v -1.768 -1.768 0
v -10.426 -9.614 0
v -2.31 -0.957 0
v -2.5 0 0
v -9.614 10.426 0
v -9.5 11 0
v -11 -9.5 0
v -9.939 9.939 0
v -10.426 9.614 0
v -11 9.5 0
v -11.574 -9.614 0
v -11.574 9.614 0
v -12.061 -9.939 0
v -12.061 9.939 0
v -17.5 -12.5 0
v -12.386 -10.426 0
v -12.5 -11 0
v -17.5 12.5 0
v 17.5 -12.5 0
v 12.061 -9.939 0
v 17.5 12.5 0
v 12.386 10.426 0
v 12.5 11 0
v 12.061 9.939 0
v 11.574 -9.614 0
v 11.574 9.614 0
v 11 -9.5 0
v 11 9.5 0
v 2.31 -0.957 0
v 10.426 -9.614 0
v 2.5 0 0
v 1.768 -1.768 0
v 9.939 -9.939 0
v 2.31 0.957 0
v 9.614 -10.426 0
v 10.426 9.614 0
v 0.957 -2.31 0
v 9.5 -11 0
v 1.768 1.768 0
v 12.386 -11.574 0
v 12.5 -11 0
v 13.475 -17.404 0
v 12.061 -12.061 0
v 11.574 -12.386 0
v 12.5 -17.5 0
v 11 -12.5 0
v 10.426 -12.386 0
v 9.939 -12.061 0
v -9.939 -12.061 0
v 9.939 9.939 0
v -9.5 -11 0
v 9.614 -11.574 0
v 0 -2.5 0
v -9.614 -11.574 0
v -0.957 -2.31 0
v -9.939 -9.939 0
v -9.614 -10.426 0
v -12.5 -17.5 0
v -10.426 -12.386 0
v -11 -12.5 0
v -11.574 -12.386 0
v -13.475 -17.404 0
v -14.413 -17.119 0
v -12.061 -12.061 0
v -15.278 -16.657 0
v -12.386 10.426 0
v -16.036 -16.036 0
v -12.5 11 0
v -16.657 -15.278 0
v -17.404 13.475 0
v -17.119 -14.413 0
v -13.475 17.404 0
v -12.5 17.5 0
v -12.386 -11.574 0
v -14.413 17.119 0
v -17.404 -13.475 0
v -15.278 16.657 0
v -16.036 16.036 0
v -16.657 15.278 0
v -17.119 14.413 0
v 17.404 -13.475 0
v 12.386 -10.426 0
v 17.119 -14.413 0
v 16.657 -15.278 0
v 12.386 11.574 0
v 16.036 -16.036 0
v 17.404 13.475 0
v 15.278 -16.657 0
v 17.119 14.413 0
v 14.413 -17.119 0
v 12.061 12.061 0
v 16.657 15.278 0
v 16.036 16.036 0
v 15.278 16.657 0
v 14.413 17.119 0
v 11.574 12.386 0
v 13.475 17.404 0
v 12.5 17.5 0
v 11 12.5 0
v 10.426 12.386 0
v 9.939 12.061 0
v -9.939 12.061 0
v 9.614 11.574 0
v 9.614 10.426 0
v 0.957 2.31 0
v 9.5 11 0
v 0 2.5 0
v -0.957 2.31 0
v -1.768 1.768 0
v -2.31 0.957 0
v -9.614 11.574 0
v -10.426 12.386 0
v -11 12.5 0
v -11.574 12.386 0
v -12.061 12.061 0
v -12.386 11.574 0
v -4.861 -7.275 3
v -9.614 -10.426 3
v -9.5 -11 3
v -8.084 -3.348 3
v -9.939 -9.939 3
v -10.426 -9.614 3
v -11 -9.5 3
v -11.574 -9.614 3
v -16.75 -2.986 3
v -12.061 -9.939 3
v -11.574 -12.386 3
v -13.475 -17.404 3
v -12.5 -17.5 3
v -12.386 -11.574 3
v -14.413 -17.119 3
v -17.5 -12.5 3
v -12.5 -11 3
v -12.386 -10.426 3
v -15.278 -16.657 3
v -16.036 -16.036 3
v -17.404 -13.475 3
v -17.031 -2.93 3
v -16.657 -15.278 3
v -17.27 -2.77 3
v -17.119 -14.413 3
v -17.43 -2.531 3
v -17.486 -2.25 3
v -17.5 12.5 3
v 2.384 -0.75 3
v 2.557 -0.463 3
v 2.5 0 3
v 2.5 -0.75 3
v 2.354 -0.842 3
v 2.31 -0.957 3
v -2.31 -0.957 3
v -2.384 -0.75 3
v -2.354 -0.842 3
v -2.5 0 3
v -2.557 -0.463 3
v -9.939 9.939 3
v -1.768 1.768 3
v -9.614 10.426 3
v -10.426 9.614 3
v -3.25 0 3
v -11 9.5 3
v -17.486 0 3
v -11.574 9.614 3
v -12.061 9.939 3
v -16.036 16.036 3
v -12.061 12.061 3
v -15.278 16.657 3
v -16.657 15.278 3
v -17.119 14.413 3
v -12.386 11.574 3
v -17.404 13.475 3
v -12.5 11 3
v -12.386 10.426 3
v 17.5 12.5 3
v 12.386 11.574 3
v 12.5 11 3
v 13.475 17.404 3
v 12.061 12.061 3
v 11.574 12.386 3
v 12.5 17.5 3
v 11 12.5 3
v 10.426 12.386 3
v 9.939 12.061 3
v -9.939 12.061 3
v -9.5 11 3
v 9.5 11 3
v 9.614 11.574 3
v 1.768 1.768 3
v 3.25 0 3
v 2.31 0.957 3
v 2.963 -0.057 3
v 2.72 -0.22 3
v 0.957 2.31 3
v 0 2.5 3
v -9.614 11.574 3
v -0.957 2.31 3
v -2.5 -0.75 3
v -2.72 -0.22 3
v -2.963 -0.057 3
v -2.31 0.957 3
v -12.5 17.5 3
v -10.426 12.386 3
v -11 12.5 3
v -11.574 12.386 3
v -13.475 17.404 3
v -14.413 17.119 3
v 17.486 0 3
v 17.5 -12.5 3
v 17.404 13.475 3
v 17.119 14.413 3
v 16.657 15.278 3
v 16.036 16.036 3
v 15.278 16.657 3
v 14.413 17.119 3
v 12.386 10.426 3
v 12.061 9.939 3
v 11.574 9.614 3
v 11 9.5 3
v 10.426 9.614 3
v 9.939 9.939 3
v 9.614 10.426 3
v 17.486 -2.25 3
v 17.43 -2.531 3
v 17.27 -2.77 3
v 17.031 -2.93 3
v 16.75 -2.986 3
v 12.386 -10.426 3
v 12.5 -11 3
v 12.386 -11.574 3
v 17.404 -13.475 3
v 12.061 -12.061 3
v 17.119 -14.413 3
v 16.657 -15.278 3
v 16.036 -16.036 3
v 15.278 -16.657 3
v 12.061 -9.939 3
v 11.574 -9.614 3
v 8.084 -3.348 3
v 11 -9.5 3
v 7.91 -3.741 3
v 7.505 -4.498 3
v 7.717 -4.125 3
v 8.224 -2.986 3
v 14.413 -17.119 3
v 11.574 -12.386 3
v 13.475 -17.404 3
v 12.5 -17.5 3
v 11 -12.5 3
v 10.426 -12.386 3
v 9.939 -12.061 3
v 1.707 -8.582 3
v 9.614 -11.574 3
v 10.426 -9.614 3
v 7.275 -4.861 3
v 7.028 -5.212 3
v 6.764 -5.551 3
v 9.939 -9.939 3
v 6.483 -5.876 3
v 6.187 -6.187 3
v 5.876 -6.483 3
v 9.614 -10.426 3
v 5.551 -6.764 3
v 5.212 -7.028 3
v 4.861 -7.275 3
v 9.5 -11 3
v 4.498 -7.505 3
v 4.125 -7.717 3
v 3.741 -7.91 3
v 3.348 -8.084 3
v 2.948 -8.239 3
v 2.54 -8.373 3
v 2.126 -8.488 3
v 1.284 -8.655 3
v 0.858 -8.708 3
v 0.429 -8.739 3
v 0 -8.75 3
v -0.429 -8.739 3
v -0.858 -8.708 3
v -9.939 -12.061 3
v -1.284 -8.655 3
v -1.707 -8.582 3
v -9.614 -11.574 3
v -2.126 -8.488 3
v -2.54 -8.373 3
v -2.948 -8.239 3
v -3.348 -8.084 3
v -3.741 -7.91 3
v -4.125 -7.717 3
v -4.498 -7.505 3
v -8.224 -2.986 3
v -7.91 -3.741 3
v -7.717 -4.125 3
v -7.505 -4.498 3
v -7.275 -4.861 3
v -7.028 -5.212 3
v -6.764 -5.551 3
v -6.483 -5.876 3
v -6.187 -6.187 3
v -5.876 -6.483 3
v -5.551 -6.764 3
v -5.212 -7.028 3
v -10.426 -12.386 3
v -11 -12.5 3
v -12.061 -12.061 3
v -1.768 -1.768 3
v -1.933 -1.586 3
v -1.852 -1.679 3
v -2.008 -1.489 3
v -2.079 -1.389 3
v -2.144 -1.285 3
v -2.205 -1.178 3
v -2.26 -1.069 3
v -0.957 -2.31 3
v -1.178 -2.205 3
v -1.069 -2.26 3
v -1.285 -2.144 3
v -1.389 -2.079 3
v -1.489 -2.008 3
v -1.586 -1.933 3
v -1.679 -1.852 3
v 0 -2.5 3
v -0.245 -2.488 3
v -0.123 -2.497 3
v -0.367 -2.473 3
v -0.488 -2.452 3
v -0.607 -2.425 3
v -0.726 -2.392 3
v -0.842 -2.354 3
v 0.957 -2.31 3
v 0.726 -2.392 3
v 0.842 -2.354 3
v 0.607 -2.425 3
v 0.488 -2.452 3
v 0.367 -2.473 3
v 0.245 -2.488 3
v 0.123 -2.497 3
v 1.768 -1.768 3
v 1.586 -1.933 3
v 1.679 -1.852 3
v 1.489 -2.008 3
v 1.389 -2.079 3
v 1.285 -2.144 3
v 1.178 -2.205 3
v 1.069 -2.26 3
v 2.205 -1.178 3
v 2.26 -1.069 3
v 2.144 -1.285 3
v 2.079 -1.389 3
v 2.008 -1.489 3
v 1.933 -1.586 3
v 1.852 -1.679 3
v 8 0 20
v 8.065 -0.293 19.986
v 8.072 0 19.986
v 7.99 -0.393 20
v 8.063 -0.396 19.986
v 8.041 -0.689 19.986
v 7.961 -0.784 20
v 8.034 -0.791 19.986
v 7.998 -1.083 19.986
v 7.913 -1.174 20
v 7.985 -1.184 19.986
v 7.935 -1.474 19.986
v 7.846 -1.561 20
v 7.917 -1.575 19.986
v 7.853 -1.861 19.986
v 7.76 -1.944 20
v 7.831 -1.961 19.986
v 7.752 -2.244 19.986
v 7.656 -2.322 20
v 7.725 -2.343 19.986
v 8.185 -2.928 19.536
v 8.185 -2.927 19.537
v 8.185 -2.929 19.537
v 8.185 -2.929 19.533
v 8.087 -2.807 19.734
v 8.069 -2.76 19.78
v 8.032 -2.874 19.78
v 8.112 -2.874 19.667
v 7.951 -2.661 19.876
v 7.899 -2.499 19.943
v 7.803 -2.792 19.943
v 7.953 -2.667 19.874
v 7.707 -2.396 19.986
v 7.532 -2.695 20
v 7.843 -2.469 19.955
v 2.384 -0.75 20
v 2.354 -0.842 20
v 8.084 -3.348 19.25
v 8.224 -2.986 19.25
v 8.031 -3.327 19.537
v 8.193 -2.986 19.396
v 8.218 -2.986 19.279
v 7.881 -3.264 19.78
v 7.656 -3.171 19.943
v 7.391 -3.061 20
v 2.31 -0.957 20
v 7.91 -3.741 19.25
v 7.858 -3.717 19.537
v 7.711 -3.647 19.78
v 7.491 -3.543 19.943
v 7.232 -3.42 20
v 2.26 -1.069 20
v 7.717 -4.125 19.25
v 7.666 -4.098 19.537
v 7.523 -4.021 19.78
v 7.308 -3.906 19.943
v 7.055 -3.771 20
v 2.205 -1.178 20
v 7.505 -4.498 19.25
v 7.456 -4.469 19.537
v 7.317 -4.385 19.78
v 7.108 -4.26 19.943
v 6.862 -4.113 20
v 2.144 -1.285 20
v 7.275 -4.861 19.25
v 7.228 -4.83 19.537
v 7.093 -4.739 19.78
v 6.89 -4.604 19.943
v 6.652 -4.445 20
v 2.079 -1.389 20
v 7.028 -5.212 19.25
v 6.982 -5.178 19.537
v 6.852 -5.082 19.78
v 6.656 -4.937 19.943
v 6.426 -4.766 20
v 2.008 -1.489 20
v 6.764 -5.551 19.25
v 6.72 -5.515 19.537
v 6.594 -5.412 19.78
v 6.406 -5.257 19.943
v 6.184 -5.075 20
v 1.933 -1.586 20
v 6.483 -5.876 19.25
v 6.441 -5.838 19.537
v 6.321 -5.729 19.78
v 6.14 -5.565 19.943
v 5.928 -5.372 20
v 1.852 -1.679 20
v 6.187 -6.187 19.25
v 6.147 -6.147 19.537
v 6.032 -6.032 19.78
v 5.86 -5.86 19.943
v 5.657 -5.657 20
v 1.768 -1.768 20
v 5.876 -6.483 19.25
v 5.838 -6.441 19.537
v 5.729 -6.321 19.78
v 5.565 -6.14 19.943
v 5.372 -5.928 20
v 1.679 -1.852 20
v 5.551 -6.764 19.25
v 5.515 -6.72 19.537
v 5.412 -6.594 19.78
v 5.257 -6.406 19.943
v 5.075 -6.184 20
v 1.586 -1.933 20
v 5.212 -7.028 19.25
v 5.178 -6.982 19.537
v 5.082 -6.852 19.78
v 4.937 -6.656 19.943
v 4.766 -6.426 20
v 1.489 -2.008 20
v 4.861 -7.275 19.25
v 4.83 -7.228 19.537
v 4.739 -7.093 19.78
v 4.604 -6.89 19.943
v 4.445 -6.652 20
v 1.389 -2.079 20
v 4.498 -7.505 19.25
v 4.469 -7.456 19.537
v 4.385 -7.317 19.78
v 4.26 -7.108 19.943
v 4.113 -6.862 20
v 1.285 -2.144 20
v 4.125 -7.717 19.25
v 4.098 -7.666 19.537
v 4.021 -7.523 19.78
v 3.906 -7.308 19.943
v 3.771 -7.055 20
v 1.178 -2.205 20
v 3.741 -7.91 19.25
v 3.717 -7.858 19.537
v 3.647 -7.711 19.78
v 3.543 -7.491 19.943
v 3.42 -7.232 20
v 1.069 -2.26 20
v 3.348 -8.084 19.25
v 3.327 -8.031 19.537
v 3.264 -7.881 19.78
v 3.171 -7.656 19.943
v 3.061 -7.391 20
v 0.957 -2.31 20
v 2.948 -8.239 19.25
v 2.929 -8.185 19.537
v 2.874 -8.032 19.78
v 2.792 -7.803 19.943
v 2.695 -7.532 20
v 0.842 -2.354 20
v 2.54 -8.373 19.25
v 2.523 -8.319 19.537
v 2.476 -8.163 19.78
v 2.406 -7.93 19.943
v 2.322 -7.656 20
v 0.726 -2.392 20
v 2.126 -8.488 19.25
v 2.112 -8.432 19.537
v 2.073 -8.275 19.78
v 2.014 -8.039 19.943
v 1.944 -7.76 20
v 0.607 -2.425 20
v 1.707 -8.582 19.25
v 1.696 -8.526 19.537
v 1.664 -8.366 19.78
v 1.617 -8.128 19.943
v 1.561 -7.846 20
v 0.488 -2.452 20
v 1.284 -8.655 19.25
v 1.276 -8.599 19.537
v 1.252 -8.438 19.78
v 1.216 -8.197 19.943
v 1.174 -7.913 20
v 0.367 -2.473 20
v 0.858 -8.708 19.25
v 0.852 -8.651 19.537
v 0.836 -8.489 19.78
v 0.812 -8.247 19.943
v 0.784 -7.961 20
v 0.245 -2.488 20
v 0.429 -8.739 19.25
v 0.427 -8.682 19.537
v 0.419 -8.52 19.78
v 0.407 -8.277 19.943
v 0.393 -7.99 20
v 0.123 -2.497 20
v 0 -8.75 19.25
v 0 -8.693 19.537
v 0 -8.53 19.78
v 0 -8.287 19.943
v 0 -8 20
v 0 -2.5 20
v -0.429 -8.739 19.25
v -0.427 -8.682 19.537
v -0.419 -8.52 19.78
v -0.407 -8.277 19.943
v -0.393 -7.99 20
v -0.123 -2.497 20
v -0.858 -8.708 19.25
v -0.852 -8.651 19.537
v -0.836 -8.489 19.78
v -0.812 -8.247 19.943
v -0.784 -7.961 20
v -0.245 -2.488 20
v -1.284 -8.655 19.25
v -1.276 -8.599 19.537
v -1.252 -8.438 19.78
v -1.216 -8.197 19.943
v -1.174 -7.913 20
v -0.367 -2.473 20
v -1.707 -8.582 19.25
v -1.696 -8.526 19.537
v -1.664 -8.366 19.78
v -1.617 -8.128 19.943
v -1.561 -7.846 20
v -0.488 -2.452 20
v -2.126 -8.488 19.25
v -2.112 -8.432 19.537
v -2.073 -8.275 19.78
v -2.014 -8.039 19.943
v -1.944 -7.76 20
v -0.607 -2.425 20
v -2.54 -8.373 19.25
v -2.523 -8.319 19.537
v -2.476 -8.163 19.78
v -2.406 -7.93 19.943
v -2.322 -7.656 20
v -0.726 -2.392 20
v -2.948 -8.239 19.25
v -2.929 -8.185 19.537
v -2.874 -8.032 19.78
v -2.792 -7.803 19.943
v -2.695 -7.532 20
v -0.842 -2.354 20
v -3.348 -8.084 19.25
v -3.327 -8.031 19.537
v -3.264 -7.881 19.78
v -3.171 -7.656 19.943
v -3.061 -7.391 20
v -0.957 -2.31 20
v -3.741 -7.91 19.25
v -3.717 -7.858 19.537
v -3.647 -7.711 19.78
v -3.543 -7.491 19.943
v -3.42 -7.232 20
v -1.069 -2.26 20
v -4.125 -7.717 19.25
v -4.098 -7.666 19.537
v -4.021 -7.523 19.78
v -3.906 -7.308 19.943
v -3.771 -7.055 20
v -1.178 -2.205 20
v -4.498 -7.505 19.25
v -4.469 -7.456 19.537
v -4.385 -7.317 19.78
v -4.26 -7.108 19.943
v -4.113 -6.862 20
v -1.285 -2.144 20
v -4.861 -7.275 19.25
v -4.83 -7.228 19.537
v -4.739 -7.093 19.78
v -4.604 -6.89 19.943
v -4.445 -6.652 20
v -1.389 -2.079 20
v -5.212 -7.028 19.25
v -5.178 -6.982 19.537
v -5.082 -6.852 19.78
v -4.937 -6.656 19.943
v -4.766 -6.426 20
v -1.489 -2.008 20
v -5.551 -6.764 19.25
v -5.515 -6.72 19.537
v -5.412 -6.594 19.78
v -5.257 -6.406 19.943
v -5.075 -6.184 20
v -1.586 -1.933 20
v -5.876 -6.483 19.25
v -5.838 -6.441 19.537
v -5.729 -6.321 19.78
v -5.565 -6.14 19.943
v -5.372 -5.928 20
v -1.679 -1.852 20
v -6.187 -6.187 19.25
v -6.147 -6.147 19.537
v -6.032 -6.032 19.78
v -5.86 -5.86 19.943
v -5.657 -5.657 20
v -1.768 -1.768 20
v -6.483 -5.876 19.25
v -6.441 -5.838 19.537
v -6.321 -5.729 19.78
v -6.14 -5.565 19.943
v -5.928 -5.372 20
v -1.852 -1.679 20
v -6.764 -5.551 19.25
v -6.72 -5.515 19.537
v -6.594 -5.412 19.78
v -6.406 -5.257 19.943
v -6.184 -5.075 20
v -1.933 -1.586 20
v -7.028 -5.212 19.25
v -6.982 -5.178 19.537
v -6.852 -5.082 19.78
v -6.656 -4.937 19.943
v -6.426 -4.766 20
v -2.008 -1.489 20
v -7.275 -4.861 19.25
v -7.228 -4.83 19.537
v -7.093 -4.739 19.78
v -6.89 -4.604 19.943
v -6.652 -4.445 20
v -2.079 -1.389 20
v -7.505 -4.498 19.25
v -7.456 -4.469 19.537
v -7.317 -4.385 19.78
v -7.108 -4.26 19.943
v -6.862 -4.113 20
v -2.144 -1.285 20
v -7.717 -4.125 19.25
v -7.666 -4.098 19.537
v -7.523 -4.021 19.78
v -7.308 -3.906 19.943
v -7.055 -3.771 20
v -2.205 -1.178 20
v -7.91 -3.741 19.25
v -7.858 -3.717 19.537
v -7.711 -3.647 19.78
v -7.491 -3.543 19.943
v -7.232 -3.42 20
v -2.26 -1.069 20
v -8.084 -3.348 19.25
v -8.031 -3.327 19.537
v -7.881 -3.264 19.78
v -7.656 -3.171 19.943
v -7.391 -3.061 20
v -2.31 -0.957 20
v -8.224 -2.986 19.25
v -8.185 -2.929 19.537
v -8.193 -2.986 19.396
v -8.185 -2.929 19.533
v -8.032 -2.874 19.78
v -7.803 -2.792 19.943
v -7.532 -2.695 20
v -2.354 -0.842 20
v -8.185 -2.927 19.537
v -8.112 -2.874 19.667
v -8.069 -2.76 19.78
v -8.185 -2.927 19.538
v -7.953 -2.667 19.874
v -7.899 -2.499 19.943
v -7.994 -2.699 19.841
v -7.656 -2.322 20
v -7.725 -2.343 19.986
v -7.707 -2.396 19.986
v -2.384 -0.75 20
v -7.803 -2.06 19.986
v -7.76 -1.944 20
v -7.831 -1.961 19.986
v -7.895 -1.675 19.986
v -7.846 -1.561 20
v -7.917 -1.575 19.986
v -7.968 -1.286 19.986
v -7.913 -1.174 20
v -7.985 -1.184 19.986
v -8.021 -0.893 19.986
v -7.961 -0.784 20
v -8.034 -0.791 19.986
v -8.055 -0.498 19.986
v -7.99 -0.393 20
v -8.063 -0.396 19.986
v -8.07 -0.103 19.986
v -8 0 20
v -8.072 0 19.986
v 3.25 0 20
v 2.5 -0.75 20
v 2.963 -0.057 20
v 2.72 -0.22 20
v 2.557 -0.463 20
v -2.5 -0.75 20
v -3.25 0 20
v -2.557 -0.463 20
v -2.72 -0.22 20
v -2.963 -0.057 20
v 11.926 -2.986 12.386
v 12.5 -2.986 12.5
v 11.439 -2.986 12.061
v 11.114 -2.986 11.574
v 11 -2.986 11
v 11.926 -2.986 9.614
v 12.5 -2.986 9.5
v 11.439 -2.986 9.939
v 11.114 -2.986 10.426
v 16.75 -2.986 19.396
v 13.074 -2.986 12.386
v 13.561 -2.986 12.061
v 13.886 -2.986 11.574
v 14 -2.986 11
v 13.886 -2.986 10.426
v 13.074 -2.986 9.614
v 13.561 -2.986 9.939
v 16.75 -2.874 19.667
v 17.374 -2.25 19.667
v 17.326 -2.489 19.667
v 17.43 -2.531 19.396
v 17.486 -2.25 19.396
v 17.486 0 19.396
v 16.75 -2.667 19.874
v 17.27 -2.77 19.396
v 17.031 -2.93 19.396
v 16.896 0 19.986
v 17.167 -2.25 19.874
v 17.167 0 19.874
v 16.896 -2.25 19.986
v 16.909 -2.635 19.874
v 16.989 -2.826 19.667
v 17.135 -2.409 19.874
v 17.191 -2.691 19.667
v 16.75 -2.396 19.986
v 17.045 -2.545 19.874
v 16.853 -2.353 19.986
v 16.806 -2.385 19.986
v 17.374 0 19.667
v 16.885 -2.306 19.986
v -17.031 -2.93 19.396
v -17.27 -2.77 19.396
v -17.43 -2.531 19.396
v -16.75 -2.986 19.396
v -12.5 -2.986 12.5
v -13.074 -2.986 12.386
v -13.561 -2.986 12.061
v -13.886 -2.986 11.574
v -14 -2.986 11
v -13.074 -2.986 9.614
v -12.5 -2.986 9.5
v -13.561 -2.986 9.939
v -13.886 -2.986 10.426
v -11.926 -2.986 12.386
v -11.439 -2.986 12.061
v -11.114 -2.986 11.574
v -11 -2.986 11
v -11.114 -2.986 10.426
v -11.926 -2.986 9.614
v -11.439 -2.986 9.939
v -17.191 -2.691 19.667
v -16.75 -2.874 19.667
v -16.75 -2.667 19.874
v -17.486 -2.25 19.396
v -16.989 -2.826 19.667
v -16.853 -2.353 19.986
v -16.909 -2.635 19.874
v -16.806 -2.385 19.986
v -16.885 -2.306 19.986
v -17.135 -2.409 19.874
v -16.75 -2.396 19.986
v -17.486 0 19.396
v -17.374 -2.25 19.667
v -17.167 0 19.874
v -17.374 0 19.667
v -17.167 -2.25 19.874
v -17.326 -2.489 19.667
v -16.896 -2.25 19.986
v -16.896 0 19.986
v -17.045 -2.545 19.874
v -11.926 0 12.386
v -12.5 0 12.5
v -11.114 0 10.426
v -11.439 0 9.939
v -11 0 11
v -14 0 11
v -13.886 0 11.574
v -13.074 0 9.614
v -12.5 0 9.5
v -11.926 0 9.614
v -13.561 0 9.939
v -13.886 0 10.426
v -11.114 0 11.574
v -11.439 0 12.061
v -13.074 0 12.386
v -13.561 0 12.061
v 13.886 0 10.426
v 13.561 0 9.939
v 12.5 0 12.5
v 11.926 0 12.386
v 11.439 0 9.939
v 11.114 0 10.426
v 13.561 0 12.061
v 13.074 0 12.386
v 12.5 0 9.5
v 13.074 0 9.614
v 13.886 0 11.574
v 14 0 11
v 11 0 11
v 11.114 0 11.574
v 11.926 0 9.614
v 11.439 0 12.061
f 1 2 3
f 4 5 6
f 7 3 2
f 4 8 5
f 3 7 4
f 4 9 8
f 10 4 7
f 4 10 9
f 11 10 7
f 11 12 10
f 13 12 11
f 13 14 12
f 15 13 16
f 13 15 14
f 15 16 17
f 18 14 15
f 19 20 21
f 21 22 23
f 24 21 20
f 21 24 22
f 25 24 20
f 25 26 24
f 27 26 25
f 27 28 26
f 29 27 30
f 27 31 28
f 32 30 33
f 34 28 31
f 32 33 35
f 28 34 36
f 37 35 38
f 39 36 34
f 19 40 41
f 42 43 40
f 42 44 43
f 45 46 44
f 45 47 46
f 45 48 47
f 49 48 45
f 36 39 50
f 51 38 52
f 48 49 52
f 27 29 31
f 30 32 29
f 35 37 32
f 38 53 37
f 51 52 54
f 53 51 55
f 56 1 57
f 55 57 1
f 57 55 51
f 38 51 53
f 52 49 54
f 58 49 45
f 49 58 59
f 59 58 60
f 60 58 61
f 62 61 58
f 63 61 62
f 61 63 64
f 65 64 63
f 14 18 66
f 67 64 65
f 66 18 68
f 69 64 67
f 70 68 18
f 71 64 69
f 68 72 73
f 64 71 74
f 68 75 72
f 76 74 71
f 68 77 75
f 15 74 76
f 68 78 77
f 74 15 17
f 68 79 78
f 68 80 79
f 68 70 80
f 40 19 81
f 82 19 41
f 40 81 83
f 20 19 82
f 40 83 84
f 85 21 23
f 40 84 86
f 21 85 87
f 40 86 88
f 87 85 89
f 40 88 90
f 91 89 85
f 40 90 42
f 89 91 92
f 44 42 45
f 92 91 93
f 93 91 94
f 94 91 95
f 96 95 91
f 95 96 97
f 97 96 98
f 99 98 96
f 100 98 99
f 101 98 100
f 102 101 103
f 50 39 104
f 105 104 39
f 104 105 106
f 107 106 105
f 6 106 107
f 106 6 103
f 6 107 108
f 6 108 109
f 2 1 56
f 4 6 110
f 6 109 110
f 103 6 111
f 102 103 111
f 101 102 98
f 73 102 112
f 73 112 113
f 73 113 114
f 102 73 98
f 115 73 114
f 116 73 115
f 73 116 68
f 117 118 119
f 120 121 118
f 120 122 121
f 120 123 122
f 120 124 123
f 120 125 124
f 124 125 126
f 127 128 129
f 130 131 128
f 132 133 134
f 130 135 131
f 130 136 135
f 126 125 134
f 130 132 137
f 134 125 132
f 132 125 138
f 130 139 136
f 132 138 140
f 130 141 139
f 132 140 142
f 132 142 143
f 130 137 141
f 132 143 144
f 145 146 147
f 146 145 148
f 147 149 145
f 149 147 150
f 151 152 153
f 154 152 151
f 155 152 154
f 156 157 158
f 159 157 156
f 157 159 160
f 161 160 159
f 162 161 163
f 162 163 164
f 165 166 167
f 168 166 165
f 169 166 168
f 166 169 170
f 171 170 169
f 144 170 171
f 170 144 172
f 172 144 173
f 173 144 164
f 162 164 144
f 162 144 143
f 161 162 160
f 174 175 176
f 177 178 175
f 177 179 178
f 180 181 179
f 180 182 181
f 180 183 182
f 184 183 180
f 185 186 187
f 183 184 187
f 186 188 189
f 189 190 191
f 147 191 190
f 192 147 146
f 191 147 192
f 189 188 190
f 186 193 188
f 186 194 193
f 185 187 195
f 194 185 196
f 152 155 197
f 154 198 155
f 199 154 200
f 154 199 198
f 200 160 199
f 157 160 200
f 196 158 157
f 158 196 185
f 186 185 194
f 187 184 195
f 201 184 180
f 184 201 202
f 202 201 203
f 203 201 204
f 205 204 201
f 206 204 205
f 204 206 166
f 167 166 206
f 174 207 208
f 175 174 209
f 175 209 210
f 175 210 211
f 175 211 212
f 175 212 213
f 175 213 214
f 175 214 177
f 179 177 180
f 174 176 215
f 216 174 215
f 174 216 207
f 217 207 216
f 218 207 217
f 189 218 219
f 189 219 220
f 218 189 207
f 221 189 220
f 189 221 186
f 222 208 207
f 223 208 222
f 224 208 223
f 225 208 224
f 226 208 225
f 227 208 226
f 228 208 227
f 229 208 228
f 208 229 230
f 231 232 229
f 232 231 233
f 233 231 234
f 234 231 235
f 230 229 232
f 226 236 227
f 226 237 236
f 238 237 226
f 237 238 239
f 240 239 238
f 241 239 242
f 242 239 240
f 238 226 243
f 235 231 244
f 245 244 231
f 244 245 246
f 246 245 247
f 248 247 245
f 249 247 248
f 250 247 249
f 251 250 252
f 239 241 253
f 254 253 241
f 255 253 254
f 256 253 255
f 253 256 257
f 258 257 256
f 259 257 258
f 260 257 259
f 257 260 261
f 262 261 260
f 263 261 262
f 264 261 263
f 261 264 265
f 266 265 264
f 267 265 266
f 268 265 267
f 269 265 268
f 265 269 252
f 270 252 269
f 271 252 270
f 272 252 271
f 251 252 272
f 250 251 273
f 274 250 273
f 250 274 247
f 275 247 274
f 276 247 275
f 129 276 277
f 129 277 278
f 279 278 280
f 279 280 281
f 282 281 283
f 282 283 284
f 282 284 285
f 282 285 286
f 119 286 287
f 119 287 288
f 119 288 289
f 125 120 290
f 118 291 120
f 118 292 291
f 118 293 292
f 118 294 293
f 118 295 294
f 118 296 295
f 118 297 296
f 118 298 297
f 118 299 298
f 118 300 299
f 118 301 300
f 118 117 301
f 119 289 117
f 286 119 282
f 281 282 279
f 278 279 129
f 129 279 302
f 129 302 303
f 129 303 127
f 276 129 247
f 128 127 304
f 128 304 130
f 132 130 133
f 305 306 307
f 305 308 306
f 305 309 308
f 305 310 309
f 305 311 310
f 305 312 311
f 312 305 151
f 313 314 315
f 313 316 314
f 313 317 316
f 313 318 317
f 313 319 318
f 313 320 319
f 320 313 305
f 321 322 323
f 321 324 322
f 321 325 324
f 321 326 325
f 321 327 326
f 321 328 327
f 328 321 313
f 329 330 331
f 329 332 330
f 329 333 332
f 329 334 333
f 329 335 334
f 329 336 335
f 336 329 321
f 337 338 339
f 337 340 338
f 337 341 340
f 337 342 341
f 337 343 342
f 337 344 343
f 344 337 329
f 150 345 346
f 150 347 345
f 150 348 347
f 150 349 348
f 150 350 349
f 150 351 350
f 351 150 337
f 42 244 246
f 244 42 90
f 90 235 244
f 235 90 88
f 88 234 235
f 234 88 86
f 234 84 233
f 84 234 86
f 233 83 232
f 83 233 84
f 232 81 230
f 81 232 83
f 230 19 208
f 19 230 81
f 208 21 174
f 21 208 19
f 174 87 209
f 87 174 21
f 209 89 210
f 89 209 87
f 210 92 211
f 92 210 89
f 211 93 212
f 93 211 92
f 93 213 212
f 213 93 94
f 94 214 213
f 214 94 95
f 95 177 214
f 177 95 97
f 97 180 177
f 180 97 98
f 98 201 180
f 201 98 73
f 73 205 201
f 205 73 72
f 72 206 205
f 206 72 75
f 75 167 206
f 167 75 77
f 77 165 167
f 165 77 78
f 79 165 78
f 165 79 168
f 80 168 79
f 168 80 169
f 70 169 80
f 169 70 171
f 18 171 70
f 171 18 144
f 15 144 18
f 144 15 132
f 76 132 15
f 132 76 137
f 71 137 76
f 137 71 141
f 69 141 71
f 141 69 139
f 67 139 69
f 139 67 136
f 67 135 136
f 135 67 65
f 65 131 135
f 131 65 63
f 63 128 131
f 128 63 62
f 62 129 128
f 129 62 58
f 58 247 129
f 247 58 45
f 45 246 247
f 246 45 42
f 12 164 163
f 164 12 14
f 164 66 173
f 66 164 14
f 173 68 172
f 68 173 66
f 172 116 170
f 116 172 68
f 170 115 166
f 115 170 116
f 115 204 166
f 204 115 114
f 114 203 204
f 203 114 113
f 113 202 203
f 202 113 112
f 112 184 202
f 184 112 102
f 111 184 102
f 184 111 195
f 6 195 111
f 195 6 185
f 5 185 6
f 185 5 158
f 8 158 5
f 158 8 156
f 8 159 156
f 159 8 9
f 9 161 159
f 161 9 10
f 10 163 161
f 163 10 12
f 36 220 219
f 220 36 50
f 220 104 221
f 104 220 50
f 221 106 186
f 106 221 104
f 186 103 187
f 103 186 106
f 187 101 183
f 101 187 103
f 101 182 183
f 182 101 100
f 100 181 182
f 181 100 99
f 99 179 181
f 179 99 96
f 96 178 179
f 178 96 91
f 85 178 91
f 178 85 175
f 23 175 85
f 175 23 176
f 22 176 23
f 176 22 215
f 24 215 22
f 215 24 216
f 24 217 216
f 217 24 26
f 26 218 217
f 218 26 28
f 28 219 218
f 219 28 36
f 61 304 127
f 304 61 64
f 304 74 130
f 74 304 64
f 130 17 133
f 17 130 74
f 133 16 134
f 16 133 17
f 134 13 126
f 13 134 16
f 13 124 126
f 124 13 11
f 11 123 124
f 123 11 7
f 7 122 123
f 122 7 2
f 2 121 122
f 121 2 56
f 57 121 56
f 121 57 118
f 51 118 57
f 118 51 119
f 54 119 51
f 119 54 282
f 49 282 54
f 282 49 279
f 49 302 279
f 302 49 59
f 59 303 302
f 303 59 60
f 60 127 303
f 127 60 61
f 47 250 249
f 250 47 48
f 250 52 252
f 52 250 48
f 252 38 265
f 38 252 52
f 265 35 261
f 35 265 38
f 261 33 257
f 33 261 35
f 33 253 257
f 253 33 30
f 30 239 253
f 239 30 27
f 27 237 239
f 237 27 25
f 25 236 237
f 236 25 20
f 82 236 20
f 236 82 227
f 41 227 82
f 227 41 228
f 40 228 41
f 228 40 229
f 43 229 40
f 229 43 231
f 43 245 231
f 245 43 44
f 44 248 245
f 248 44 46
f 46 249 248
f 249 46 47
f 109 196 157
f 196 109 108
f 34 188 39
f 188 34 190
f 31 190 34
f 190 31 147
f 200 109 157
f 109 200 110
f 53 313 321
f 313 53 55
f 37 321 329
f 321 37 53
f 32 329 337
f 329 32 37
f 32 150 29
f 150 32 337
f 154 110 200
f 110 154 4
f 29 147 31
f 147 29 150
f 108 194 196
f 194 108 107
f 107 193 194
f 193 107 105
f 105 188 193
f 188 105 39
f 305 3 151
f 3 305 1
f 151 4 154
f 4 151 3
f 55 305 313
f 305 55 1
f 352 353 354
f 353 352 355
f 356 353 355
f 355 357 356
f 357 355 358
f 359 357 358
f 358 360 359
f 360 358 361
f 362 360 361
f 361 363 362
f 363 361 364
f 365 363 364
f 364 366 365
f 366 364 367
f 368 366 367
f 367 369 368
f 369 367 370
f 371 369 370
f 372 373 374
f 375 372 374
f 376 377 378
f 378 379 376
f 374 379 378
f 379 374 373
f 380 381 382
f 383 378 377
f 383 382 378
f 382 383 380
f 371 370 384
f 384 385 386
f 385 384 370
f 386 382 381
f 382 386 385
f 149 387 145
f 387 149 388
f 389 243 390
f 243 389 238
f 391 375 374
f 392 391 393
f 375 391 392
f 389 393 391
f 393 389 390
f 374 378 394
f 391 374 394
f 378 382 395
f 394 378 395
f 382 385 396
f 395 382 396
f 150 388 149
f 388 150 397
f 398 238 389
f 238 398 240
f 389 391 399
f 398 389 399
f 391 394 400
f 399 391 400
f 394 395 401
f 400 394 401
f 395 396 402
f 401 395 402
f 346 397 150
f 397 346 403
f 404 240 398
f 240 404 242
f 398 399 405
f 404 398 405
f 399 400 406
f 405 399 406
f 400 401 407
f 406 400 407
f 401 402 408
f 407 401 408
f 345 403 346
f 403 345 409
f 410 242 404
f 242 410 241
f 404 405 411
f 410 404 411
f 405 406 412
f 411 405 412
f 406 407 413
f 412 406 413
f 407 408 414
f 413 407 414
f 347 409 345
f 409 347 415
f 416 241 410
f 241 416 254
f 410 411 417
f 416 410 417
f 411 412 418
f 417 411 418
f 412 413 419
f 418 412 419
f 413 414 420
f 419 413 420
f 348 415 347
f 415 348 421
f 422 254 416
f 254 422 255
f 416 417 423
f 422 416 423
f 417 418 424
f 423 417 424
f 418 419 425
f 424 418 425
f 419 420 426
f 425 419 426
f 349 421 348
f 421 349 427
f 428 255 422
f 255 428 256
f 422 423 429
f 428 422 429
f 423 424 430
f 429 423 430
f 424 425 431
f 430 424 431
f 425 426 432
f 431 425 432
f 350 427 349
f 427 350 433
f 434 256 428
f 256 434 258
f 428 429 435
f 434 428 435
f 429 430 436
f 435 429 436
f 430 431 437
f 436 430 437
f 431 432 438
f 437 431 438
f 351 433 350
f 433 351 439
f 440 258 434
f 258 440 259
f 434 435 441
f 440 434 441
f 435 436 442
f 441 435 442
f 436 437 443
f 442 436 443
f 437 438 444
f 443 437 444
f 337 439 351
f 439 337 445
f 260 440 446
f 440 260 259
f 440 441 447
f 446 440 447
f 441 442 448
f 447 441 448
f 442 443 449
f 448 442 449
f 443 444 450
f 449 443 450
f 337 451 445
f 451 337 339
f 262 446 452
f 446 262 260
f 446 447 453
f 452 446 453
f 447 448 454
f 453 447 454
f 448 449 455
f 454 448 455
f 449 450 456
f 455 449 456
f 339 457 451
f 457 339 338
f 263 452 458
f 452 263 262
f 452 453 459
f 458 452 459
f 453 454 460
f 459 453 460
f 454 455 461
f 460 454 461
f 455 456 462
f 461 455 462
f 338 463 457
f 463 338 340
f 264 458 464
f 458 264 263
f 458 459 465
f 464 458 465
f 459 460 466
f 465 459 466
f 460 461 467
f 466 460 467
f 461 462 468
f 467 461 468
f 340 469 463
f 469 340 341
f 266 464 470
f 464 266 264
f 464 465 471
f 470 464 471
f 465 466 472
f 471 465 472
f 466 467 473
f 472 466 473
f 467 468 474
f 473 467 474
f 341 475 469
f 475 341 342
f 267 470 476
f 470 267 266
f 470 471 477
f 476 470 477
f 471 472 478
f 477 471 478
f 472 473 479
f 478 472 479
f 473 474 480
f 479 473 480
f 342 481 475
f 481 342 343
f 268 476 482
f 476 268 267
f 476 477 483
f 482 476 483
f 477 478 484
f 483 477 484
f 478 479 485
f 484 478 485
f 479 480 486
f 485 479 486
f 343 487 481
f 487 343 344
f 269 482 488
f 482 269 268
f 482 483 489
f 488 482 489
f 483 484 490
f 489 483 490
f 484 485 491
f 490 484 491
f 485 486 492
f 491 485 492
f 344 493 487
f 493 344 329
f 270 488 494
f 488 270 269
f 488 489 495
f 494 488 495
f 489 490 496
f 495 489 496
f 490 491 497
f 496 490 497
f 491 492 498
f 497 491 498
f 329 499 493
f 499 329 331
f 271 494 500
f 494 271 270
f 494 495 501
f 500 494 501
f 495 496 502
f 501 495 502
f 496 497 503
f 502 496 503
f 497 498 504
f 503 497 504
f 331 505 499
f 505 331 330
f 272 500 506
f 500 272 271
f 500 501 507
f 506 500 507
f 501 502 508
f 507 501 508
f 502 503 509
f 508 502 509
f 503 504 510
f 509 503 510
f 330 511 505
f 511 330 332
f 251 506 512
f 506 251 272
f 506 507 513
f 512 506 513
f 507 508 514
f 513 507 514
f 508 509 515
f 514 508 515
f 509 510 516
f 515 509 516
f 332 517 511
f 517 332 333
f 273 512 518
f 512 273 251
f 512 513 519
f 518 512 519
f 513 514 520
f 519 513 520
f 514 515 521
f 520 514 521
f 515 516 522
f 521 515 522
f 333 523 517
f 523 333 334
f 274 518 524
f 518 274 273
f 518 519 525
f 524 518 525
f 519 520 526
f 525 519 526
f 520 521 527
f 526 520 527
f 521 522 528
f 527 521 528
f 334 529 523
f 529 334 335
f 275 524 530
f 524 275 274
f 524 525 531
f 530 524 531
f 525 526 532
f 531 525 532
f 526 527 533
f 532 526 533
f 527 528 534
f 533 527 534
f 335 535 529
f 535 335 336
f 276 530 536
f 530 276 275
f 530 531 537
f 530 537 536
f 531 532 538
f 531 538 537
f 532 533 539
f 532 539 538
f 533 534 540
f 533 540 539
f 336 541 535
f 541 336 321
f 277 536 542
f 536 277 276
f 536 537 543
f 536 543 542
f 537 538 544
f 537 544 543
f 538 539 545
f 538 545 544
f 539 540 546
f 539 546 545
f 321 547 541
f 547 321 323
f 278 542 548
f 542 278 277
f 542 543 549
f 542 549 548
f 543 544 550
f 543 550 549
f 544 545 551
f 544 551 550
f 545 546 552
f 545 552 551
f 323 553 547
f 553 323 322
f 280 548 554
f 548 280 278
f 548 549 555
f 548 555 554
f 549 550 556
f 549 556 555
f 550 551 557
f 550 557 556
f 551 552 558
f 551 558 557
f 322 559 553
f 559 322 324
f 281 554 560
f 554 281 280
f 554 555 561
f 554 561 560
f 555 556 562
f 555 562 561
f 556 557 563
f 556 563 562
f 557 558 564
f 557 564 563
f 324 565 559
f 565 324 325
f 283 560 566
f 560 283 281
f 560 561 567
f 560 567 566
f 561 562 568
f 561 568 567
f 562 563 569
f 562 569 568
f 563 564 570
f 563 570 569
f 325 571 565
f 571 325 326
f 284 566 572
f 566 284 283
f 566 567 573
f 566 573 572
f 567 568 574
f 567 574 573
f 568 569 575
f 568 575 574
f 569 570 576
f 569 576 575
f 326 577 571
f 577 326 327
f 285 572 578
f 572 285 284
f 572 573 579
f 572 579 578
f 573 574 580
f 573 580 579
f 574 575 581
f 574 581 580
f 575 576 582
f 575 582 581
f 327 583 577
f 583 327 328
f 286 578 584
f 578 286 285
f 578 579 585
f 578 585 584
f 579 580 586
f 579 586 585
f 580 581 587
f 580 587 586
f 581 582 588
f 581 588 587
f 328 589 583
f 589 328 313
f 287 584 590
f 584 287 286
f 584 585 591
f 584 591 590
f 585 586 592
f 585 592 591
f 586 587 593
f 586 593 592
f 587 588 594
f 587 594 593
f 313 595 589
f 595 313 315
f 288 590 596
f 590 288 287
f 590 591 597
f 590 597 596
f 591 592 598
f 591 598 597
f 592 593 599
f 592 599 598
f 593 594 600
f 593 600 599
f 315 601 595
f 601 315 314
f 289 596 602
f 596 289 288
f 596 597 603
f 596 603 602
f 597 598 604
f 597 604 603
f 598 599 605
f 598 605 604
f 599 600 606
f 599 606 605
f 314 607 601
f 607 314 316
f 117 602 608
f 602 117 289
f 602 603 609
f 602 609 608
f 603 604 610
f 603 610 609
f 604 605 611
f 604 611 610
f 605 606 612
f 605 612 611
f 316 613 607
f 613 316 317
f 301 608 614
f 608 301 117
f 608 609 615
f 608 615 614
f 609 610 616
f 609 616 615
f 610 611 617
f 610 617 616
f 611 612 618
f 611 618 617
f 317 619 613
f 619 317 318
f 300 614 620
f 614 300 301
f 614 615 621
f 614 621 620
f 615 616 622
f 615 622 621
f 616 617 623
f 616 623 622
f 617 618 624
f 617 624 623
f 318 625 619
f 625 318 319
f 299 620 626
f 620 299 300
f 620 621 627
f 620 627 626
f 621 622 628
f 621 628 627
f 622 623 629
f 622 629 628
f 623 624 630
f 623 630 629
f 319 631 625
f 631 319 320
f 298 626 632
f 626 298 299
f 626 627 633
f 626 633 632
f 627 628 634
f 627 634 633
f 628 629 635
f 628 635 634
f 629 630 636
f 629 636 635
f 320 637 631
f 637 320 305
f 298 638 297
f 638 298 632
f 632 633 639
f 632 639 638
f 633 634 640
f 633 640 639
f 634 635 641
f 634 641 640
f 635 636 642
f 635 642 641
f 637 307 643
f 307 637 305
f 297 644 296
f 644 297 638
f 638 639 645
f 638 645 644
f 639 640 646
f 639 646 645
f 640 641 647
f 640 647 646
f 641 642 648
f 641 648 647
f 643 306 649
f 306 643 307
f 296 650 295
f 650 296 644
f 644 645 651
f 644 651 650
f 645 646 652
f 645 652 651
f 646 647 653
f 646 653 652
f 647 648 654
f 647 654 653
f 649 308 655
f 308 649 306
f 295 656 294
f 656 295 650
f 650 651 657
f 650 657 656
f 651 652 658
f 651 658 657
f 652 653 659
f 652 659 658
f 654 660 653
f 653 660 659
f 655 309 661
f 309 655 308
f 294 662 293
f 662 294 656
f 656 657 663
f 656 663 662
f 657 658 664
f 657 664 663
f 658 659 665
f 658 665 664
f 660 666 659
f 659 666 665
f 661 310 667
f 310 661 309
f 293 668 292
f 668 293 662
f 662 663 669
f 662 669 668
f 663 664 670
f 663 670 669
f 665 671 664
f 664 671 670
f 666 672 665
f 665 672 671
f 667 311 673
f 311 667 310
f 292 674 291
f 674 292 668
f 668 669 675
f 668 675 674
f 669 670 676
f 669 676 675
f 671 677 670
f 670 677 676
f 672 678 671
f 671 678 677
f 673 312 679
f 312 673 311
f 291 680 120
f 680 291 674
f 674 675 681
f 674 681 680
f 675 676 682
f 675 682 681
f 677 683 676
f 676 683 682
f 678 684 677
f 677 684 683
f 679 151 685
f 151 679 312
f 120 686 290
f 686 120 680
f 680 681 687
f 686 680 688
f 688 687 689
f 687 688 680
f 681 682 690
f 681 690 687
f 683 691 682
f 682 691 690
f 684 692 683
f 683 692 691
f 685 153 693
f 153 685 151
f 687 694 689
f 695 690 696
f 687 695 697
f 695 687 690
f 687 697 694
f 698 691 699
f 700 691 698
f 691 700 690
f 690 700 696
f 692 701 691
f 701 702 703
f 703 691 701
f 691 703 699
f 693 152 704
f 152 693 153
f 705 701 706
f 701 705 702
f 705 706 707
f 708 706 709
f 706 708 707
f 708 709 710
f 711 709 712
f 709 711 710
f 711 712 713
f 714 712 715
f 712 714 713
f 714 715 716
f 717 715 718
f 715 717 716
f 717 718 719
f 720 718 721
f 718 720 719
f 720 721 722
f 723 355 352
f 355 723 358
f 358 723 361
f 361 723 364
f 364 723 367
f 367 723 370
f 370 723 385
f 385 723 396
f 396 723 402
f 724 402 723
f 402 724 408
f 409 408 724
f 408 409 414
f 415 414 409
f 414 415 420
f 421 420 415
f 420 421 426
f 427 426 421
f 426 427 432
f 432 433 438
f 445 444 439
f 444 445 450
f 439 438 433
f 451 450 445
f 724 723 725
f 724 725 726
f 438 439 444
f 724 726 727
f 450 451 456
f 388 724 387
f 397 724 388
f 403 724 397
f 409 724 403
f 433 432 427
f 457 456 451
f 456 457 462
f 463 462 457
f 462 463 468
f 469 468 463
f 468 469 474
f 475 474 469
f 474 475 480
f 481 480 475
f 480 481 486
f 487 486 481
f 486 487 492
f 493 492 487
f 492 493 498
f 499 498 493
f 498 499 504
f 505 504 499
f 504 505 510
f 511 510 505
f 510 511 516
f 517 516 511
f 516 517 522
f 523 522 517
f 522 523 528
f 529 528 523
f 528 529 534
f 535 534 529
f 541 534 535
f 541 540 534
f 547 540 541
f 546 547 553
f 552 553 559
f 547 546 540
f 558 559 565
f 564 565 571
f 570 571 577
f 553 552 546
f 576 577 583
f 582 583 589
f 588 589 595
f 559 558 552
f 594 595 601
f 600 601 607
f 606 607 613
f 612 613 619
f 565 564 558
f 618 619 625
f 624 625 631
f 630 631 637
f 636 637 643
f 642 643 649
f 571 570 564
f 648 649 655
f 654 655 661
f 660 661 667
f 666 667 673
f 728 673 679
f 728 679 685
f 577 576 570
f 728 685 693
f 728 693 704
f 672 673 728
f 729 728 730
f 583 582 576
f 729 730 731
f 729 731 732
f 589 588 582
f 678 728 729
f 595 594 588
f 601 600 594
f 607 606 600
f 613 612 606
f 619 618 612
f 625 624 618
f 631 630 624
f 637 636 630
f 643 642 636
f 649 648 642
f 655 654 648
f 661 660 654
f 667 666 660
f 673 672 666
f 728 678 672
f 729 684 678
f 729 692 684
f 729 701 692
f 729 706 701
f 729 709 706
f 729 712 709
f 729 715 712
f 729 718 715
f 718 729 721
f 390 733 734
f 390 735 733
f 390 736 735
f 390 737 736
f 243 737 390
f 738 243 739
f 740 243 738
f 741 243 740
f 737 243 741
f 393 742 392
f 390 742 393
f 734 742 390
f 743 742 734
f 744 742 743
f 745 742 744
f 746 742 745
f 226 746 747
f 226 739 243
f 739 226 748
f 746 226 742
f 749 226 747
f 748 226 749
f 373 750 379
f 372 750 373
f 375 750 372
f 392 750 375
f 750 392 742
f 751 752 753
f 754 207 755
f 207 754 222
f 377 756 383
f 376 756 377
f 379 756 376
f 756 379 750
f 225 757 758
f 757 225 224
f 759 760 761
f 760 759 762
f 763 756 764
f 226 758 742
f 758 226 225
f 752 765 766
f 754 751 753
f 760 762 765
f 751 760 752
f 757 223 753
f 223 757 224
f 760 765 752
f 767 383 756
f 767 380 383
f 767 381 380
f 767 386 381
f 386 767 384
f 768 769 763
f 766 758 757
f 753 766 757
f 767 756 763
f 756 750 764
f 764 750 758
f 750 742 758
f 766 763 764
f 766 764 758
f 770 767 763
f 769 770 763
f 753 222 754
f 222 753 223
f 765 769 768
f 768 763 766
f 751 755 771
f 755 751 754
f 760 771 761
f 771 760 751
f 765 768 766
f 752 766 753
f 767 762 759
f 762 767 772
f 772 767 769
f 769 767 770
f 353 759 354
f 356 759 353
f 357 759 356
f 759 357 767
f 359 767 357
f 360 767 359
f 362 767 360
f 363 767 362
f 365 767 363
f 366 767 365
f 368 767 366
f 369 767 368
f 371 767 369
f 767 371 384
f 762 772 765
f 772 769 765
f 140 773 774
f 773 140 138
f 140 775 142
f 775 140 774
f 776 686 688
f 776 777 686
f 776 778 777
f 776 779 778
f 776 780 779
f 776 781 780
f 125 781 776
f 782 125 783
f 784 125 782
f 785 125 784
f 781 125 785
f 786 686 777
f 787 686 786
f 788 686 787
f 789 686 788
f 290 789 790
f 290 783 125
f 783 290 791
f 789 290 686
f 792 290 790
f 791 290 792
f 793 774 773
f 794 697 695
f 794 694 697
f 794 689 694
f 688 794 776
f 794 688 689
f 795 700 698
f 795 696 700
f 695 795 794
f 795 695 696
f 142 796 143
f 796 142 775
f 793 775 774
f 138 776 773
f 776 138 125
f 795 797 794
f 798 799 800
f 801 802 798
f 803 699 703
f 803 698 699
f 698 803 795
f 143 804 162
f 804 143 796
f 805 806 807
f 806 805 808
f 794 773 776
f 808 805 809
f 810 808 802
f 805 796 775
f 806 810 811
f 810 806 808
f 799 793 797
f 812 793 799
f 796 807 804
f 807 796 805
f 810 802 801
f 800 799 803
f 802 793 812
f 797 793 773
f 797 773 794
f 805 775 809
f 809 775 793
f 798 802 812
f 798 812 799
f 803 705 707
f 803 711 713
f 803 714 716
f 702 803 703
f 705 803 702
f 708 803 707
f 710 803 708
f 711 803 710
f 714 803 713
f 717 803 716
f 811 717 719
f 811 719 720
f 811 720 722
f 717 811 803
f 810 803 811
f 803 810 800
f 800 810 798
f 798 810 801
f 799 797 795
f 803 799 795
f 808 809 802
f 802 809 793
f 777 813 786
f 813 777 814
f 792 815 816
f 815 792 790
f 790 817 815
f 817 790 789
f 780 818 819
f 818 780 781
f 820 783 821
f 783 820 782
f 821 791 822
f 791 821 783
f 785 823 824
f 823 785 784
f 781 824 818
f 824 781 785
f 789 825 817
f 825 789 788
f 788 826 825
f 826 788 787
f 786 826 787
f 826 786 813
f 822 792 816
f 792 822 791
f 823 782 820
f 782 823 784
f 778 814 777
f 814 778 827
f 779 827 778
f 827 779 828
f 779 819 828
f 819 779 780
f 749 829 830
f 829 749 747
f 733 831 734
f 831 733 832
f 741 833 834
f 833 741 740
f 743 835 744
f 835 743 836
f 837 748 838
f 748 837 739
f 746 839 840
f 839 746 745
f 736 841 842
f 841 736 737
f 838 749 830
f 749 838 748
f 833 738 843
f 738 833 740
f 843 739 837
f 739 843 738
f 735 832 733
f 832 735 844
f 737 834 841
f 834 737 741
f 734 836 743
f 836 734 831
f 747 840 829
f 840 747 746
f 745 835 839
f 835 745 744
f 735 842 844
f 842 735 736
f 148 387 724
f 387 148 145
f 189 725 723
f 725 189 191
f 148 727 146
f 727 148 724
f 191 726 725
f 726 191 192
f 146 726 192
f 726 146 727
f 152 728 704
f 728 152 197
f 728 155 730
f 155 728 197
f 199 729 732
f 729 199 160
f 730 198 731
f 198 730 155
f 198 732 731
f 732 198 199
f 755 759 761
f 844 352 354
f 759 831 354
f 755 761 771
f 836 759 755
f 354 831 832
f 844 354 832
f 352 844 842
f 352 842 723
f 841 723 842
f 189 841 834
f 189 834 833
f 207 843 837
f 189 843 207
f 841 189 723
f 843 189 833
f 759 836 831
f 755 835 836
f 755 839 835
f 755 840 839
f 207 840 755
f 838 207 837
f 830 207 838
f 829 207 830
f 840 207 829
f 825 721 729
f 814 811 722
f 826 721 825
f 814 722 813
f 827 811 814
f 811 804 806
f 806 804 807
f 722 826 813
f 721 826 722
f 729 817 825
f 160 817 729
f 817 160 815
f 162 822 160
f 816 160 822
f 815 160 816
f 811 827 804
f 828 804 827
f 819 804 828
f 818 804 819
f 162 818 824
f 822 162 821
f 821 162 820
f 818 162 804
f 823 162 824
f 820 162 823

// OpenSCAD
// file: clamplib.scad
holesize = 3;

module roundedBox(dim, r)
{
  hull() {
    for (z=[-0.5,0.5], y=[-0.5,0.5], x=[-0.5,0.5]) {
      translate([x*(dim.x-2*r), y*(dim.y-2*r), z*(dim.z-2*r)]) sphere(r);
    }
  }
}

module clampCylinder()
{
  rotate_extrude(convexity=2, $fn=128)
    translate([$inner_diameter/2 + $width/4,0]) {
        hull() {
          square([$width/2, $height], center=true);
          translate([$width-$roundingRadius,-$height/2+$roundingRadius]) circle($roundingRadius, $fn=$roundingDetail);
          translate([$width-$roundingRadius,$height/2-$roundingRadius]) circle($roundingRadius, $fn=$roundingDetail);
        }
    }
}

module doubleclamp() {
	hole_horiz_pos = $clamp_width+$width+$inner_diameter/2 - $clamp_width/2;
	
	module hole() {
	  rotate([0,90,0]) cylinder($fn=16, r=holesize/2, h=$clamp_thickness*2.5, center=true);
	}

	difference() {
            union() {
                clampCylinder($inner_diameter, $width);
	        translate([0, ($clamp_width+$width/2)/2 + $width/2 + $inner_diameter/2]) 
	          roundedBox([2*$clamp_thickness, $clamp_width+$width/2, $height], $roundingRadius, $fn=$roundingDetail);
	        translate([0, -($clamp_width+$width/2)/2 - $width/2 - $inner_diameter/2]) 
	          roundedBox([2*$clamp_thickness, $clamp_width+$width/2, $height], $roundingRadius, $fn=$roundingDetail);
            }

            for (h=hole_horiz_pos*[-1,1]) {
                for (i=[0:$holes-1], hole_vert_pos = -$height/2 + (i+0.5)*$height/$holes+1 ) {
    	            translate([0,h,hole_vert_pos]) hole();
                }
            }
	}
}

module innerProfile()
{
  difference() {
      cube([$roundingRadius*2, $roundingRadius*2, $height*1.2], center=true);
      translate([$roundingRadius, $roundingRadius, 0]) cylinder(h=$height*1.3, r=$roundingRadius, center=true, $fn=$roundingDetail);
  }
}

module clamp(inner_diameter, outer_diameter, clamp_width, clamp_thickness, height, holes) {
  $roundingRadius = clamp_thickness/4;
  $roundingDetail = 16;
  $inner_diameter = inner_diameter;
  $clamp_width = clamp_width;
  $clamp_thickness = clamp_thickness;
  $width = outer_diameter - inner_diameter;
  $height = height;
  $holes = holes;

  cubesize = 2.1*[inner_diameter+$width, inner_diameter+$width+clamp_width, height];
  difference() {
    doubleclamp(inner_diameter, $width, clamp_width, clamp_thickness);
    translate([-cubesize.x/2, 0, 0]) cube(cubesize, center=true);
    translate([0, inner_diameter/2, 0]) innerProfile();
    translate([0, -inner_diameter/2, 0]) rotate([0,0,-90]) innerProfile();
  }
}
// main file
use <clamplib.scad>

plate_thickness = 3;
fiber_hole_diam = 5;
plate_width = 30;
plate_height = 30;
clamp_height = 20;

module faceplate(width, height) {
  margin = 8;
  linear_extrude(height=plate_thickness, convexity=2) {
    difference() {
//      square([width, height], center=true);
      hull() for(j=[-1,1], i=[-1,1]) translate([i/2*(width-5), j/2*(height-5)]) circle(r=5, $fn=32);
      for (j=[-1,1], i=[-1,1]) {
        translate([i/2*(width-margin), j/2*(height-margin)]) circle(r=1.5, $fn=16);
      }
    }
  }
}

module faceclamp() {
  rotate([0,0,-90])
    clamp(inner_diameter=fiber_hole_diam,
          outer_diameter=fiber_hole_diam*2,
          clamp_width=10,
          clamp_thickness=3,
          height=clamp_height,
          holes=1);
}

difference() {
  faceplate(plate_width, plate_height);
  cylinder(h=plate_thickness*4, r=fiber_hole_diam/2, center=true, $fn=16);
}

translate([0,0,clamp_height/2]) faceclamp();
